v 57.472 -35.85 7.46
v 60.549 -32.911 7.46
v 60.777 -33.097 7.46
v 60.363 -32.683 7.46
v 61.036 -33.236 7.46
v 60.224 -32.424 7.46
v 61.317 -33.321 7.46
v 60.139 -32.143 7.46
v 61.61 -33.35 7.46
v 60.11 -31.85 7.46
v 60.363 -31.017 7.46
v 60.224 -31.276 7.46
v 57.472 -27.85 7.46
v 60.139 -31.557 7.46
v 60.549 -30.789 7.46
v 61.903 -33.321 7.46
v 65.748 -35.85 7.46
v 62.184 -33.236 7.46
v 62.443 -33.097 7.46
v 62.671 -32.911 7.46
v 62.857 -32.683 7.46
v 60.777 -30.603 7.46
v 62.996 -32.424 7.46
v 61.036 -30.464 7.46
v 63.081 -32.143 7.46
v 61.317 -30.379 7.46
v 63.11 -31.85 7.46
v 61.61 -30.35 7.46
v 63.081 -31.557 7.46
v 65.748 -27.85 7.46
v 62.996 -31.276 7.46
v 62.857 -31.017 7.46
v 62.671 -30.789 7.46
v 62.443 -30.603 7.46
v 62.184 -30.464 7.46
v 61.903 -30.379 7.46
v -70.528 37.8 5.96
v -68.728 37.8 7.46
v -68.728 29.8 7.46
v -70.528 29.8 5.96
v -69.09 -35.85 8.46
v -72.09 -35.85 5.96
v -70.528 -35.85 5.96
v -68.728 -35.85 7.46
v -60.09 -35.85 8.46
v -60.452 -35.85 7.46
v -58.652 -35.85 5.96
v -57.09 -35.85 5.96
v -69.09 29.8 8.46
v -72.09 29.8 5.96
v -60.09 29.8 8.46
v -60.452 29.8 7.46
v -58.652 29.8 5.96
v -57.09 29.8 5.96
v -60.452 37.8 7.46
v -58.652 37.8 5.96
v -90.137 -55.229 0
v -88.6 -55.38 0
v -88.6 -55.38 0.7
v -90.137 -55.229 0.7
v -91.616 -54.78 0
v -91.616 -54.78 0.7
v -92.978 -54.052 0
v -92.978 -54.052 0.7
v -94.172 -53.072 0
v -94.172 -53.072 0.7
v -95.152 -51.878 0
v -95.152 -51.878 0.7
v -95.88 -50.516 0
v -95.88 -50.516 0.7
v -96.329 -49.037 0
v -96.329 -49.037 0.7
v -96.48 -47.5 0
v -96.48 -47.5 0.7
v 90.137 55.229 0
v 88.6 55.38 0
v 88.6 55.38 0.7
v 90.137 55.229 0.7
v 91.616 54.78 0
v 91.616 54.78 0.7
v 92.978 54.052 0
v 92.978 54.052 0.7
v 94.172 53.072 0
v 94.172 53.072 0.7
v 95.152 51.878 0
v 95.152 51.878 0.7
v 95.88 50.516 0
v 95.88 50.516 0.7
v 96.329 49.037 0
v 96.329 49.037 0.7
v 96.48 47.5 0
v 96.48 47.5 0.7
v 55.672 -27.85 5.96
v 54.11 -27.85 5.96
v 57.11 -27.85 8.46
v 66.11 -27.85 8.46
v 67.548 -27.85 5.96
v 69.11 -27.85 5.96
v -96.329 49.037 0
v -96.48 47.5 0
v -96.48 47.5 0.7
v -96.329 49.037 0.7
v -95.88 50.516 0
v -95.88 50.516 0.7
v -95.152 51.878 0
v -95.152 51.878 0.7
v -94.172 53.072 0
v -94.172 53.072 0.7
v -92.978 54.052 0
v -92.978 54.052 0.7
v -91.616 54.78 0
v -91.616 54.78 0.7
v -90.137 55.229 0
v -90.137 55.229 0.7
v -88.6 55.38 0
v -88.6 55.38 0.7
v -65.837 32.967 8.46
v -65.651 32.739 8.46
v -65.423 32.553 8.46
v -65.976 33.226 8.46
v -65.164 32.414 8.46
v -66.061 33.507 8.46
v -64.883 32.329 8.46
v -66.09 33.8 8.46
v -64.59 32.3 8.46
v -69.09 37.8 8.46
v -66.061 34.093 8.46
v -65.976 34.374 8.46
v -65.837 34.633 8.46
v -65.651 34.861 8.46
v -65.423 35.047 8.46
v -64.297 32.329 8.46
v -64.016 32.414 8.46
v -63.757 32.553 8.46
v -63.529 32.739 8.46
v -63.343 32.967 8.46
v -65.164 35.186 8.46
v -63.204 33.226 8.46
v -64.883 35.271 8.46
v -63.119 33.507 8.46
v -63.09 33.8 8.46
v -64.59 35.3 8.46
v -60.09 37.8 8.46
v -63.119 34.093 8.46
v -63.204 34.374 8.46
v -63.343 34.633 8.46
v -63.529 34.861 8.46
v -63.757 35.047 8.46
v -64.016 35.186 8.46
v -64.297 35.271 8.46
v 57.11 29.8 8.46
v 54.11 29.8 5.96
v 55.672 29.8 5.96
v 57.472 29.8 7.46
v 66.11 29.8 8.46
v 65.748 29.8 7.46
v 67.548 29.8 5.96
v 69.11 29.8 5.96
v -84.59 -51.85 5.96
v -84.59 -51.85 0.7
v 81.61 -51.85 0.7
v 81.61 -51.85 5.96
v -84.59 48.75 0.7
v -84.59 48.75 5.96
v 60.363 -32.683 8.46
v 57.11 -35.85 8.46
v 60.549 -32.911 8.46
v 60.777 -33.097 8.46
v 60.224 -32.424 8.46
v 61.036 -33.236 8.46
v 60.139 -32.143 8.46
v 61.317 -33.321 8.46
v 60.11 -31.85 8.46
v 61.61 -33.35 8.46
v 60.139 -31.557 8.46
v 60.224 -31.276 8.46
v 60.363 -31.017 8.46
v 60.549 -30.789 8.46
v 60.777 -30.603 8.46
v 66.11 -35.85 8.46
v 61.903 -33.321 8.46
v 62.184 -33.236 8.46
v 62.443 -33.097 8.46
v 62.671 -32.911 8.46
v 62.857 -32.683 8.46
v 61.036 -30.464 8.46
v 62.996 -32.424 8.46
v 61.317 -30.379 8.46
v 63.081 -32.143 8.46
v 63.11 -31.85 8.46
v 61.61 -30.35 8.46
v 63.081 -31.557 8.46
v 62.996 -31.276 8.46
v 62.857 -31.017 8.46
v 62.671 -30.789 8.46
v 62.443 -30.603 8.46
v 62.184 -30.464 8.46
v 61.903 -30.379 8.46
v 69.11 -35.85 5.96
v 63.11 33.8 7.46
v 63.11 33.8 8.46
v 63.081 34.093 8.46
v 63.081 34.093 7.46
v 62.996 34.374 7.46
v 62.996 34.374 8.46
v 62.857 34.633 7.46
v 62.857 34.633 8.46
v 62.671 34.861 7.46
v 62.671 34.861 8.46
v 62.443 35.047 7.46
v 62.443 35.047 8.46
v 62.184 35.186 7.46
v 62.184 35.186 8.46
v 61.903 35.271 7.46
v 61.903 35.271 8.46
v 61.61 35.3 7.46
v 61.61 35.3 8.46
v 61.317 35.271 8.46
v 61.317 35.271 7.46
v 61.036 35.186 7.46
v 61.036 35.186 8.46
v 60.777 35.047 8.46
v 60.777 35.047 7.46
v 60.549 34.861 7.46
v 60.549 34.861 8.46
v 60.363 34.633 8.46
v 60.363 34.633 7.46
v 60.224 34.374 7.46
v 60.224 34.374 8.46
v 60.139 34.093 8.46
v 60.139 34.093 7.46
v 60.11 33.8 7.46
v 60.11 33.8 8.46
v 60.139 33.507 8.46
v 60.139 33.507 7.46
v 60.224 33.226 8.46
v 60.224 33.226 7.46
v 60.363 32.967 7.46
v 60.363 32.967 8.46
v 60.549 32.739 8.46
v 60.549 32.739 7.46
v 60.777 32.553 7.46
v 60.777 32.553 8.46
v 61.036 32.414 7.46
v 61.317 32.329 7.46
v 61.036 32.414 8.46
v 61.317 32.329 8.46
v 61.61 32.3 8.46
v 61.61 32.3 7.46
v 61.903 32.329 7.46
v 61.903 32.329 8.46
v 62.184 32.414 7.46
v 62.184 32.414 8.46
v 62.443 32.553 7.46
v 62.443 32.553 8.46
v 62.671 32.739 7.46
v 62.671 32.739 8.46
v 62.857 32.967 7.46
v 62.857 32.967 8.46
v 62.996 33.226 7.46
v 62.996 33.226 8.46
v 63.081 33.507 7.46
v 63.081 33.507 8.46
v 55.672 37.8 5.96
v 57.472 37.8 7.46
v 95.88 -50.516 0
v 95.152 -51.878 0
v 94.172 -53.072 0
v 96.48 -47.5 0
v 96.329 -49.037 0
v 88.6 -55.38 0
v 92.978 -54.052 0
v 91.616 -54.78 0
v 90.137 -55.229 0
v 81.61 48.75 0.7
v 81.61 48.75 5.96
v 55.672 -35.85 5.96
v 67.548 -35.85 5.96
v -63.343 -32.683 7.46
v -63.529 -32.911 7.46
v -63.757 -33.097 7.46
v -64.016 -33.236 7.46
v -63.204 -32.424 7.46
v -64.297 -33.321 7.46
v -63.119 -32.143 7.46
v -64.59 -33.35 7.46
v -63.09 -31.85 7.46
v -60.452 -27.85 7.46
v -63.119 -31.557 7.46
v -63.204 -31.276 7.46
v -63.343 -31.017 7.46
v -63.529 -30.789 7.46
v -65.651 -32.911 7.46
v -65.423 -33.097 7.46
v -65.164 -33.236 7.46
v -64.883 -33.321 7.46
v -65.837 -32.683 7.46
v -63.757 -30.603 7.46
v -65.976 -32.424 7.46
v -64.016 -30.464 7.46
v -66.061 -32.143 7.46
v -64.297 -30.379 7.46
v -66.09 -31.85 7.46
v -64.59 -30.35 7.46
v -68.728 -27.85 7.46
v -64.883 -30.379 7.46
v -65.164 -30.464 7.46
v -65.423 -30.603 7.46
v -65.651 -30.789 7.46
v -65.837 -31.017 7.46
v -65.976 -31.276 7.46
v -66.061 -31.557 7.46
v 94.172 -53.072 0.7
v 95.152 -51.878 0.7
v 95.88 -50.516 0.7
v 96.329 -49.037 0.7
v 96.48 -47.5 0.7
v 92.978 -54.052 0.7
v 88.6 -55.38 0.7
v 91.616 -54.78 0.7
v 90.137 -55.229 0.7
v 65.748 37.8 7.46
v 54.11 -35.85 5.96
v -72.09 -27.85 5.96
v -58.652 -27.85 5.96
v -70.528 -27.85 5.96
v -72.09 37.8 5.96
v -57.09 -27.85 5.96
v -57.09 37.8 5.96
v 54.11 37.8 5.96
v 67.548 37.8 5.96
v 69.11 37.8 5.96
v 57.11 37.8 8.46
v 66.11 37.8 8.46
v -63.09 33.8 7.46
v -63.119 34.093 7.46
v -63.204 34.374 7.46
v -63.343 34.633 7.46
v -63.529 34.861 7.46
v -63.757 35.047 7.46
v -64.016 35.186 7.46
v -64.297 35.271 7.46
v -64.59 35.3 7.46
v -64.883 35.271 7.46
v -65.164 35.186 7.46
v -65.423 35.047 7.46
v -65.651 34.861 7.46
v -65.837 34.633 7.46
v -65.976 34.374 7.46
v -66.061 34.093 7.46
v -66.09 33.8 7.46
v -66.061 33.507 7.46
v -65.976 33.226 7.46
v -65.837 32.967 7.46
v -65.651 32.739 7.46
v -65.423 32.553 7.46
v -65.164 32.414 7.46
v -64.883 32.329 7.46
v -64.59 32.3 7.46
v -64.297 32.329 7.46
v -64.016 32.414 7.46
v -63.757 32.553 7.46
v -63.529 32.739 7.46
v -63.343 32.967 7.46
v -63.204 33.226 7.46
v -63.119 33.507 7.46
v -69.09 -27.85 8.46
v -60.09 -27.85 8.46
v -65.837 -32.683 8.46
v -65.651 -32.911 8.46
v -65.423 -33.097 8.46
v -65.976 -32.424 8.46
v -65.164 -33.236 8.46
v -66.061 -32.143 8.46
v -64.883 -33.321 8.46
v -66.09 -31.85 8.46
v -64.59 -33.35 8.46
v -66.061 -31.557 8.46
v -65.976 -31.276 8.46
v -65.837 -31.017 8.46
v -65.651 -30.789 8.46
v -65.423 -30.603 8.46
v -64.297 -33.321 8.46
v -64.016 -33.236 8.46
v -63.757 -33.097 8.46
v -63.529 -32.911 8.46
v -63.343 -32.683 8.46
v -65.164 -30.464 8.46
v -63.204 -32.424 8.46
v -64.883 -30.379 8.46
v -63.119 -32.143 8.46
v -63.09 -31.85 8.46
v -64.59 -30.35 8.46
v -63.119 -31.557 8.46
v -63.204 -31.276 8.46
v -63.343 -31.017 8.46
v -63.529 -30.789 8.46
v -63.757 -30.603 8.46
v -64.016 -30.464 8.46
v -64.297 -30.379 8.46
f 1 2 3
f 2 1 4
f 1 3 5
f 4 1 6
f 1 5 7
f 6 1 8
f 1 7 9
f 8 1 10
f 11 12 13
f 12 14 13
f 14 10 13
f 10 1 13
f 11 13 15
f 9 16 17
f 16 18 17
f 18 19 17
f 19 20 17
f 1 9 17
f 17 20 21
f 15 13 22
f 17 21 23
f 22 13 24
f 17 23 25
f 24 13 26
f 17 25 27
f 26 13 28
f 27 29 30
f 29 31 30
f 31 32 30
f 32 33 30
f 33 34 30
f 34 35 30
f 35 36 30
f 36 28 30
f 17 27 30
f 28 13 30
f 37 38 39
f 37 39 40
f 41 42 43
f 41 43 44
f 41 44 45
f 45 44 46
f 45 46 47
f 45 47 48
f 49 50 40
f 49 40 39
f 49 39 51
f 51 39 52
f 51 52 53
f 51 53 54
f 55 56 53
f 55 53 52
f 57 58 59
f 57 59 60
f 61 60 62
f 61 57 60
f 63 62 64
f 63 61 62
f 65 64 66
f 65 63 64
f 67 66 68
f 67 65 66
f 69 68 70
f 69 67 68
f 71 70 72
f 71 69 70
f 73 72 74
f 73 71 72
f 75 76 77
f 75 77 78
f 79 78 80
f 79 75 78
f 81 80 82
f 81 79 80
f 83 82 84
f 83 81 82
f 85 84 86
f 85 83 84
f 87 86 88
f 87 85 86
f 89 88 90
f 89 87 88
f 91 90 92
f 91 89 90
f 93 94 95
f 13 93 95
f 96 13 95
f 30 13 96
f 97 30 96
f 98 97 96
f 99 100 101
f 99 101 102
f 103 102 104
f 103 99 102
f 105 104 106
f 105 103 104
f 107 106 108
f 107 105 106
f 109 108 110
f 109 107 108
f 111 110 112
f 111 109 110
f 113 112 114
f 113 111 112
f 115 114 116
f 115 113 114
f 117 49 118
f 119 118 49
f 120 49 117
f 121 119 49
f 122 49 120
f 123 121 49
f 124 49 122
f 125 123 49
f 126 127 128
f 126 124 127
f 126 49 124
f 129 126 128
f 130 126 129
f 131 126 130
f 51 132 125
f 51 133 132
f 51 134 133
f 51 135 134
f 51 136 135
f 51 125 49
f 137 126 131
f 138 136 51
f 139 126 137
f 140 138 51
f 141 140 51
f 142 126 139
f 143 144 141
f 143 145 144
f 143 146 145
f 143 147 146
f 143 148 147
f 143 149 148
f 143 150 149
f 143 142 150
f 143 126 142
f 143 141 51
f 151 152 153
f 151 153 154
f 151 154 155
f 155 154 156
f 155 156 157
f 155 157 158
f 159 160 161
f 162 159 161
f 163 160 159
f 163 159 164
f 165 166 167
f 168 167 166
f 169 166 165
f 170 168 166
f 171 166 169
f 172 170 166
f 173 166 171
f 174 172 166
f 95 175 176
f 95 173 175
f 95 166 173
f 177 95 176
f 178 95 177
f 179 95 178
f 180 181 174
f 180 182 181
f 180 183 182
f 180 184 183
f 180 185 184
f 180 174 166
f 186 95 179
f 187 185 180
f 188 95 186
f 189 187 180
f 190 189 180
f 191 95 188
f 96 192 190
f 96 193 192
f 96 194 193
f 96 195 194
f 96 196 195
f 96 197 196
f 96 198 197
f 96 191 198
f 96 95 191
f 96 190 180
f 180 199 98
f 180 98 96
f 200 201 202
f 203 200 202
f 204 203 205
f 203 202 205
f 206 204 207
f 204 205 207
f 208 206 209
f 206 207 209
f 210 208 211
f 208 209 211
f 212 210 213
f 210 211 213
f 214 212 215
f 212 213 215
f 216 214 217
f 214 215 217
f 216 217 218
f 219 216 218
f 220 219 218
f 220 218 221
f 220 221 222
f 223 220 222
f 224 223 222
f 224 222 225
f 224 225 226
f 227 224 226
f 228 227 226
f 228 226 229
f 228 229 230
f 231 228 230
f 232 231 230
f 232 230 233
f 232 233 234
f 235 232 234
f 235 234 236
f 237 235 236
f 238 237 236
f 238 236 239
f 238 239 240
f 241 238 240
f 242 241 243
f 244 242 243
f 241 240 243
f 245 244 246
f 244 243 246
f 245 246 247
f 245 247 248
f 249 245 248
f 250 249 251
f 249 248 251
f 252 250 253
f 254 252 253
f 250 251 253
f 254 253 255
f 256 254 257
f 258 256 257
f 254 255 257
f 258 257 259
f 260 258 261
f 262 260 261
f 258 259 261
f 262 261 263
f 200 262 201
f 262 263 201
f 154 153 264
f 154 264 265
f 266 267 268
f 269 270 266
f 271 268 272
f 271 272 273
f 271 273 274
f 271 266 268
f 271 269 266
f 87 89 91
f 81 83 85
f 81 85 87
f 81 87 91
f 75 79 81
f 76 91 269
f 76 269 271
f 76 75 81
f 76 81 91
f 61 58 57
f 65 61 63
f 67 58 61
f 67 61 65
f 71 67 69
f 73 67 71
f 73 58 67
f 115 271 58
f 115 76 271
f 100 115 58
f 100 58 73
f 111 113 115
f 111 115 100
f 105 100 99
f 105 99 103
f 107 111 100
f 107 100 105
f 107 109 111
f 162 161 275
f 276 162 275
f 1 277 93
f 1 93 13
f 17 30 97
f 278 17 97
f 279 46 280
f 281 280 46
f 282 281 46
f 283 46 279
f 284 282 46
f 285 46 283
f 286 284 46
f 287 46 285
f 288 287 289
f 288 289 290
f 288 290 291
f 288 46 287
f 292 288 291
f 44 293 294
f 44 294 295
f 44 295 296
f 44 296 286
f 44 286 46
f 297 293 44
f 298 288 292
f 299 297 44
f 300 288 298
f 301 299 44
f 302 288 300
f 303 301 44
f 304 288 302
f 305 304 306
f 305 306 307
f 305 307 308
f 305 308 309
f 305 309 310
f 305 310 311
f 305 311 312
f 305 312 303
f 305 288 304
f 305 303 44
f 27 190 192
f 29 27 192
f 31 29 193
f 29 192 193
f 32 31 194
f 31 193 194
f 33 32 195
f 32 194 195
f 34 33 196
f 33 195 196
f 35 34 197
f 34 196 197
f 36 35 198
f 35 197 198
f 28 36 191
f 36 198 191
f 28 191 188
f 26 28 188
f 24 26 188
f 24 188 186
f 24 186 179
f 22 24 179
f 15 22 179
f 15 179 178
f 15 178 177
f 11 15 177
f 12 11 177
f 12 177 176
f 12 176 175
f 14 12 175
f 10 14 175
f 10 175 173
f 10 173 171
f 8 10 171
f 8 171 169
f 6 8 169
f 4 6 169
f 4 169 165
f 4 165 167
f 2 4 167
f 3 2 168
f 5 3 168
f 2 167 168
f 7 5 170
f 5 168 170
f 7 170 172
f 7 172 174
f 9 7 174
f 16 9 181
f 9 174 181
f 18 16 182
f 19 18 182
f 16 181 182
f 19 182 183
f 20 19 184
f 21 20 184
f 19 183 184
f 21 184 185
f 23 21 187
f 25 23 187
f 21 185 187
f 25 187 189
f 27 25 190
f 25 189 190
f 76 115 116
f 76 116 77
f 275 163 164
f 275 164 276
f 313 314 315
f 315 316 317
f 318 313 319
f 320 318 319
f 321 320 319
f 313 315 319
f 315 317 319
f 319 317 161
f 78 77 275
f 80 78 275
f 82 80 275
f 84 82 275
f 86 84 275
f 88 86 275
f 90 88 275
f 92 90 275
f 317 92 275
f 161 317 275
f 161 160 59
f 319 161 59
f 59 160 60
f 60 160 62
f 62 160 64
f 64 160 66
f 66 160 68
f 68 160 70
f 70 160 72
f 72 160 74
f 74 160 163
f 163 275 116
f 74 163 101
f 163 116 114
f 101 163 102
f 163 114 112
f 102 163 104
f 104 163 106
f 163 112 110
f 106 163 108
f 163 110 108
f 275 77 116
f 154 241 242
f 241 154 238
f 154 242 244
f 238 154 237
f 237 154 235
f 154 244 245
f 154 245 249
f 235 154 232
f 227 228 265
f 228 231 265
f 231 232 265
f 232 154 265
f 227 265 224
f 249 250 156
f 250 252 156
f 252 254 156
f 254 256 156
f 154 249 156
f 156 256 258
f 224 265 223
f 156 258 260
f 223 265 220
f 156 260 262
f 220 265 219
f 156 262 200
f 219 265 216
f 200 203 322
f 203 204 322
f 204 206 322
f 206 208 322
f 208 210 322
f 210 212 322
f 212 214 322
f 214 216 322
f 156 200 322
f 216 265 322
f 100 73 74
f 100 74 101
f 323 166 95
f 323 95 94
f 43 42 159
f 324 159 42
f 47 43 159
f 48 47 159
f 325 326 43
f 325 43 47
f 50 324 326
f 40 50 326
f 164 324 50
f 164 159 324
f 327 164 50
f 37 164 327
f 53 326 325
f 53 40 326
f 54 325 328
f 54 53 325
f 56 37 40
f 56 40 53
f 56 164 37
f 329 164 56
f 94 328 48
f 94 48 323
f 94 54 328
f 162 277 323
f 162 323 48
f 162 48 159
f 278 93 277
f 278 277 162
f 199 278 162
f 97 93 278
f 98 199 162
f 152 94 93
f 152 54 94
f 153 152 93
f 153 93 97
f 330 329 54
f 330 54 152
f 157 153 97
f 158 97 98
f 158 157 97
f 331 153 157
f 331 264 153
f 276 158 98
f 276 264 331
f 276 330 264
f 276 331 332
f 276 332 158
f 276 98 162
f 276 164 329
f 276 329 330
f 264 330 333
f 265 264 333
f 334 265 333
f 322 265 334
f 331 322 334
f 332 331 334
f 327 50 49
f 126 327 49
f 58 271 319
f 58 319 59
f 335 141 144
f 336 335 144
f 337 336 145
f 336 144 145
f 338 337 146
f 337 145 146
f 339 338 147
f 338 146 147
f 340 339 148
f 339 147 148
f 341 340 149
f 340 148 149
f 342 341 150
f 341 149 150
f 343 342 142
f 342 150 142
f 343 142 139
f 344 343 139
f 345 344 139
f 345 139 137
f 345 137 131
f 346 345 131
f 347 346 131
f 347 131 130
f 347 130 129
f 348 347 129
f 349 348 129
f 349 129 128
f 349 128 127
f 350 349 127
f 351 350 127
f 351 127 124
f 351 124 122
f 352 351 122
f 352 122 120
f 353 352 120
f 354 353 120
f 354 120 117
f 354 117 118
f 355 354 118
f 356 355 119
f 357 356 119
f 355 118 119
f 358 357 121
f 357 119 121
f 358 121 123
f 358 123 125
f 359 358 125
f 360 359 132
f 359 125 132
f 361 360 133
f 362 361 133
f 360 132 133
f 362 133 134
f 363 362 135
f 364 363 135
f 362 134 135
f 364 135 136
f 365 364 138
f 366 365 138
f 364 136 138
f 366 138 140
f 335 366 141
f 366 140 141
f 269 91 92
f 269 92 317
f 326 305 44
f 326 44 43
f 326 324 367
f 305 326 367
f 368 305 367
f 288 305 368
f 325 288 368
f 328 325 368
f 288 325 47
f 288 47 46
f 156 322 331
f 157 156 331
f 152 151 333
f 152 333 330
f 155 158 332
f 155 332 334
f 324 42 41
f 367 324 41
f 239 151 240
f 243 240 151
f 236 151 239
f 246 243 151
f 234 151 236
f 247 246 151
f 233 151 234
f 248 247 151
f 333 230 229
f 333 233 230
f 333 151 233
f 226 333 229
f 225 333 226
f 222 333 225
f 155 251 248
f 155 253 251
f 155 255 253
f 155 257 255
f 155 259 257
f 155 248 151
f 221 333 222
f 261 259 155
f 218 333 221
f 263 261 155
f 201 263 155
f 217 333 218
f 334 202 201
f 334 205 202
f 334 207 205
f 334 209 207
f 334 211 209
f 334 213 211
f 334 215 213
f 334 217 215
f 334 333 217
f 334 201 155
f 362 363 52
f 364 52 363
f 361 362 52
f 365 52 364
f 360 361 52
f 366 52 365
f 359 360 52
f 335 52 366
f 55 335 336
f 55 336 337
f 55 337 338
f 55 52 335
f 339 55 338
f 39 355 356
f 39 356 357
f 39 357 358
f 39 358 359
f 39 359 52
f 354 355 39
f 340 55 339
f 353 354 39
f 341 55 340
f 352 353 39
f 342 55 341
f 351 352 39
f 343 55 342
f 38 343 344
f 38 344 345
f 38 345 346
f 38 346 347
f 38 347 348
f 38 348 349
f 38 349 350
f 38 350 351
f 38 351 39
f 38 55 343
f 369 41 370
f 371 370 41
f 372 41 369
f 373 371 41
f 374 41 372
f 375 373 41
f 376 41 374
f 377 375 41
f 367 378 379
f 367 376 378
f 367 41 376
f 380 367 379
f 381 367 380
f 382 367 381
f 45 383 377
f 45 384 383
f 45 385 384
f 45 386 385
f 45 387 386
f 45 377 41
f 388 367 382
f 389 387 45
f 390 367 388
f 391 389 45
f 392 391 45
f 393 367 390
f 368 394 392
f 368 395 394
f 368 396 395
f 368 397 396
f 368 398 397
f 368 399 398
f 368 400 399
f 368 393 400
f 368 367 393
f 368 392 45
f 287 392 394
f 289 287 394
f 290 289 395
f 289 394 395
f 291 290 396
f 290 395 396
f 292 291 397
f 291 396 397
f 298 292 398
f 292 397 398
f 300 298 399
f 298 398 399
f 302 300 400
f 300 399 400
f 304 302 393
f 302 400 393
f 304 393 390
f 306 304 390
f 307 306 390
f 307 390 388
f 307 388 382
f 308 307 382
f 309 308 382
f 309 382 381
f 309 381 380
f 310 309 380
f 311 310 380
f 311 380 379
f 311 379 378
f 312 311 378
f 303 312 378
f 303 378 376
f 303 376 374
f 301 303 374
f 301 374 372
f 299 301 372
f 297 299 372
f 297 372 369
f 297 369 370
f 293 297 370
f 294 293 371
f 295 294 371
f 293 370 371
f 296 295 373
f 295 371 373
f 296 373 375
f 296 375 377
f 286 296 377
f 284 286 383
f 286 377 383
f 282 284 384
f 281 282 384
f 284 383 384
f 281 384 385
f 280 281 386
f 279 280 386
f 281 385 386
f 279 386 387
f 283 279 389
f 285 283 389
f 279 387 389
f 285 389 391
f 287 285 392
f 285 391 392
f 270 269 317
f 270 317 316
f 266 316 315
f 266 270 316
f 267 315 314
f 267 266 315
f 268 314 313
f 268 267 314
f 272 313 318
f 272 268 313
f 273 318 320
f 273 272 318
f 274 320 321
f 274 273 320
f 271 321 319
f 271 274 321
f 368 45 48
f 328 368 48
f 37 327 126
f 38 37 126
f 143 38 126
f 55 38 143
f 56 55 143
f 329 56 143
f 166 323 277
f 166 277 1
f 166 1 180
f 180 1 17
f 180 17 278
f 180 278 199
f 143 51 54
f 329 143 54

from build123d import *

# Parameters (mm, degrees)
BOSS_EXTRUDE1_DEPTH     = 0.7
SKETCH2_W               = 166.2
SKETCH2_H               = 100.6
BOSS_EXTRUDE2_DEPTH     = 5.26
SKETCH3_W               = 15
SKETCH3_H               = 8
BOSS_EXTRUDE3_DEPTH     = 2.5
CUT_EXTRUDE1_DEPTH      = 134.052151054
CUT_EXTRUDE1_DEPTH_BACK = 134.052151054
CUT_EXTRUDE2_REACH      = 113.566
SKETCH5_R               = 1.5


with BuildPart() as part:
    # Sketch1 → Boss-Extrude1 (new body)
    with BuildSketch(Plane.XY):
        with BuildLine():
            Line((-88.6, 55.38), (88.6, 55.38))
            ThreePointArc((88.6, 55.38), (94.172001436, 53.072001436), (96.48, 47.5))
            Line((96.48, 47.5), (96.48, -47.5))
            ThreePointArc((96.48, -47.5), (94.172001436, -53.072001436), (88.6, -55.38))
            Line((88.6, -55.38), (-88.6, -55.38))
            ThreePointArc((-88.6, -55.38), (-94.172001436, -53.072001436), (-96.48, -47.5))
            Line((-96.48, -47.5), (-96.48, 47.5))
            ThreePointArc((-96.48, 47.5), (-94.172001436, 53.072001436), (-88.6, 55.38))
        make_face()
    extrude(amount=BOSS_EXTRUDE1_DEPTH)

    # Sketch2 → Boss-Extrude2 (add)
    with BuildSketch(Plane.XY.offset(0.7)):
        with Locations((-1.49, -1.55)):
            Rectangle(SKETCH2_W, SKETCH2_H)
    extrude(amount=BOSS_EXTRUDE2_DEPTH)

    # Sketch3 → Boss-Extrude3 (add)
    with BuildSketch(Plane.XY.offset(5.96)):
        with Locations((-64.59, 33.8)):
            Rectangle(SKETCH3_W, SKETCH3_H)
        with Locations((-64.59, -31.85)):
            Rectangle(SKETCH3_W, SKETCH3_H)
        with Locations((61.61, 33.8)):
            Rectangle(SKETCH3_W, SKETCH3_H)
        with Locations((61.61, -31.85)):
            Rectangle(SKETCH3_W, SKETCH3_H)
    extrude(amount=BOSS_EXTRUDE3_DEPTH)

    # Sketch4 → Cut-Extrude1 (cut, two sides: drawn at the far end of the back side and taken through both)
    with BuildSketch(Plane.XZ.offset(35.85).offset(-CUT_EXTRUDE1_DEPTH_BACK)):
        Polygon((-72.09, 8.46), (-72.09, 5.96), (-69.09, 8.46), align=None)
        Polygon((-57.09, 5.96), (-57.09, 8.46), (-60.09, 8.46), align=None)
        Polygon((-60.452049935, 7.46), (-68.727950065, 7.46), (-70.527950065, 5.96), (-58.652049935, 5.96), align=None)
        Polygon((55.672049935, 5.96), (57.472049935, 7.46), (65.747950065, 7.46), (67.547950065, 5.96), align=None)
        Polygon((57.11, 8.46), (54.11, 5.96), (54.11, 8.46), align=None)
        Polygon((66.11, 8.46), (69.11, 8.46), (69.11, 5.96), align=None)
    extrude(amount=CUT_EXTRUDE1_DEPTH + CUT_EXTRUDE1_DEPTH_BACK, mode=Mode.SUBTRACT)

    # Sketch5 → Cut-Extrude2 (cut, up to next)
    with BuildSketch(Plane.XY.offset(8.46), mode=Mode.PRIVATE) as cut_extrude2_sk1:
        with Locations((-64.59, 33.8)):
            Circle(SKETCH5_R)
    cut_extrude2_tool1 = extrude(cut_extrude2_sk1.sketch, amount=-CUT_EXTRUDE2_REACH, mode=Mode.PRIVATE) & part.part
    # Sketch5 → Cut-Extrude2 (cut, up to next)
    with BuildSketch(Plane.XY.offset(8.46), mode=Mode.PRIVATE) as cut_extrude2_sk2:
        with Locations((-64.59, -31.85)):
            Circle(SKETCH5_R)
    cut_extrude2_tool2 = extrude(cut_extrude2_sk2.sketch, amount=-CUT_EXTRUDE2_REACH, mode=Mode.PRIVATE) & part.part
    # Sketch5 → Cut-Extrude2 (cut, up to next)
    with BuildSketch(Plane.XY.offset(8.46), mode=Mode.PRIVATE) as cut_extrude2_sk3:
        with Locations((61.61, -31.85)):
            Circle(SKETCH5_R)
    cut_extrude2_tool3 = extrude(cut_extrude2_sk3.sketch, amount=-CUT_EXTRUDE2_REACH, mode=Mode.PRIVATE) & part.part
    # Sketch5 → Cut-Extrude2 (cut, up to next)
    with BuildSketch(Plane.XY.offset(8.46), mode=Mode.PRIVATE) as cut_extrude2_sk4:
        with Locations((61.61, 33.8)):
            Circle(SKETCH5_R)
    cut_extrude2_tool4 = extrude(cut_extrude2_sk4.sketch, amount=-CUT_EXTRUDE2_REACH, mode=Mode.PRIVATE) & part.part
    add(cut_extrude2_tool1.solids().sort_by_distance((-64.59, 33.8, 8.46))[0], mode=Mode.SUBTRACT)
    add(cut_extrude2_tool2.solids().sort_by_distance((-64.59, -31.85, 8.46))[0], mode=Mode.SUBTRACT)
    add(cut_extrude2_tool3.solids().sort_by_distance((61.61, -31.85, 8.46))[0], mode=Mode.SUBTRACT)
    add(cut_extrude2_tool4.solids().sort_by_distance((61.61, 33.8, 8.46))[0], mode=Mode.SUBTRACT)


solid = part.part
